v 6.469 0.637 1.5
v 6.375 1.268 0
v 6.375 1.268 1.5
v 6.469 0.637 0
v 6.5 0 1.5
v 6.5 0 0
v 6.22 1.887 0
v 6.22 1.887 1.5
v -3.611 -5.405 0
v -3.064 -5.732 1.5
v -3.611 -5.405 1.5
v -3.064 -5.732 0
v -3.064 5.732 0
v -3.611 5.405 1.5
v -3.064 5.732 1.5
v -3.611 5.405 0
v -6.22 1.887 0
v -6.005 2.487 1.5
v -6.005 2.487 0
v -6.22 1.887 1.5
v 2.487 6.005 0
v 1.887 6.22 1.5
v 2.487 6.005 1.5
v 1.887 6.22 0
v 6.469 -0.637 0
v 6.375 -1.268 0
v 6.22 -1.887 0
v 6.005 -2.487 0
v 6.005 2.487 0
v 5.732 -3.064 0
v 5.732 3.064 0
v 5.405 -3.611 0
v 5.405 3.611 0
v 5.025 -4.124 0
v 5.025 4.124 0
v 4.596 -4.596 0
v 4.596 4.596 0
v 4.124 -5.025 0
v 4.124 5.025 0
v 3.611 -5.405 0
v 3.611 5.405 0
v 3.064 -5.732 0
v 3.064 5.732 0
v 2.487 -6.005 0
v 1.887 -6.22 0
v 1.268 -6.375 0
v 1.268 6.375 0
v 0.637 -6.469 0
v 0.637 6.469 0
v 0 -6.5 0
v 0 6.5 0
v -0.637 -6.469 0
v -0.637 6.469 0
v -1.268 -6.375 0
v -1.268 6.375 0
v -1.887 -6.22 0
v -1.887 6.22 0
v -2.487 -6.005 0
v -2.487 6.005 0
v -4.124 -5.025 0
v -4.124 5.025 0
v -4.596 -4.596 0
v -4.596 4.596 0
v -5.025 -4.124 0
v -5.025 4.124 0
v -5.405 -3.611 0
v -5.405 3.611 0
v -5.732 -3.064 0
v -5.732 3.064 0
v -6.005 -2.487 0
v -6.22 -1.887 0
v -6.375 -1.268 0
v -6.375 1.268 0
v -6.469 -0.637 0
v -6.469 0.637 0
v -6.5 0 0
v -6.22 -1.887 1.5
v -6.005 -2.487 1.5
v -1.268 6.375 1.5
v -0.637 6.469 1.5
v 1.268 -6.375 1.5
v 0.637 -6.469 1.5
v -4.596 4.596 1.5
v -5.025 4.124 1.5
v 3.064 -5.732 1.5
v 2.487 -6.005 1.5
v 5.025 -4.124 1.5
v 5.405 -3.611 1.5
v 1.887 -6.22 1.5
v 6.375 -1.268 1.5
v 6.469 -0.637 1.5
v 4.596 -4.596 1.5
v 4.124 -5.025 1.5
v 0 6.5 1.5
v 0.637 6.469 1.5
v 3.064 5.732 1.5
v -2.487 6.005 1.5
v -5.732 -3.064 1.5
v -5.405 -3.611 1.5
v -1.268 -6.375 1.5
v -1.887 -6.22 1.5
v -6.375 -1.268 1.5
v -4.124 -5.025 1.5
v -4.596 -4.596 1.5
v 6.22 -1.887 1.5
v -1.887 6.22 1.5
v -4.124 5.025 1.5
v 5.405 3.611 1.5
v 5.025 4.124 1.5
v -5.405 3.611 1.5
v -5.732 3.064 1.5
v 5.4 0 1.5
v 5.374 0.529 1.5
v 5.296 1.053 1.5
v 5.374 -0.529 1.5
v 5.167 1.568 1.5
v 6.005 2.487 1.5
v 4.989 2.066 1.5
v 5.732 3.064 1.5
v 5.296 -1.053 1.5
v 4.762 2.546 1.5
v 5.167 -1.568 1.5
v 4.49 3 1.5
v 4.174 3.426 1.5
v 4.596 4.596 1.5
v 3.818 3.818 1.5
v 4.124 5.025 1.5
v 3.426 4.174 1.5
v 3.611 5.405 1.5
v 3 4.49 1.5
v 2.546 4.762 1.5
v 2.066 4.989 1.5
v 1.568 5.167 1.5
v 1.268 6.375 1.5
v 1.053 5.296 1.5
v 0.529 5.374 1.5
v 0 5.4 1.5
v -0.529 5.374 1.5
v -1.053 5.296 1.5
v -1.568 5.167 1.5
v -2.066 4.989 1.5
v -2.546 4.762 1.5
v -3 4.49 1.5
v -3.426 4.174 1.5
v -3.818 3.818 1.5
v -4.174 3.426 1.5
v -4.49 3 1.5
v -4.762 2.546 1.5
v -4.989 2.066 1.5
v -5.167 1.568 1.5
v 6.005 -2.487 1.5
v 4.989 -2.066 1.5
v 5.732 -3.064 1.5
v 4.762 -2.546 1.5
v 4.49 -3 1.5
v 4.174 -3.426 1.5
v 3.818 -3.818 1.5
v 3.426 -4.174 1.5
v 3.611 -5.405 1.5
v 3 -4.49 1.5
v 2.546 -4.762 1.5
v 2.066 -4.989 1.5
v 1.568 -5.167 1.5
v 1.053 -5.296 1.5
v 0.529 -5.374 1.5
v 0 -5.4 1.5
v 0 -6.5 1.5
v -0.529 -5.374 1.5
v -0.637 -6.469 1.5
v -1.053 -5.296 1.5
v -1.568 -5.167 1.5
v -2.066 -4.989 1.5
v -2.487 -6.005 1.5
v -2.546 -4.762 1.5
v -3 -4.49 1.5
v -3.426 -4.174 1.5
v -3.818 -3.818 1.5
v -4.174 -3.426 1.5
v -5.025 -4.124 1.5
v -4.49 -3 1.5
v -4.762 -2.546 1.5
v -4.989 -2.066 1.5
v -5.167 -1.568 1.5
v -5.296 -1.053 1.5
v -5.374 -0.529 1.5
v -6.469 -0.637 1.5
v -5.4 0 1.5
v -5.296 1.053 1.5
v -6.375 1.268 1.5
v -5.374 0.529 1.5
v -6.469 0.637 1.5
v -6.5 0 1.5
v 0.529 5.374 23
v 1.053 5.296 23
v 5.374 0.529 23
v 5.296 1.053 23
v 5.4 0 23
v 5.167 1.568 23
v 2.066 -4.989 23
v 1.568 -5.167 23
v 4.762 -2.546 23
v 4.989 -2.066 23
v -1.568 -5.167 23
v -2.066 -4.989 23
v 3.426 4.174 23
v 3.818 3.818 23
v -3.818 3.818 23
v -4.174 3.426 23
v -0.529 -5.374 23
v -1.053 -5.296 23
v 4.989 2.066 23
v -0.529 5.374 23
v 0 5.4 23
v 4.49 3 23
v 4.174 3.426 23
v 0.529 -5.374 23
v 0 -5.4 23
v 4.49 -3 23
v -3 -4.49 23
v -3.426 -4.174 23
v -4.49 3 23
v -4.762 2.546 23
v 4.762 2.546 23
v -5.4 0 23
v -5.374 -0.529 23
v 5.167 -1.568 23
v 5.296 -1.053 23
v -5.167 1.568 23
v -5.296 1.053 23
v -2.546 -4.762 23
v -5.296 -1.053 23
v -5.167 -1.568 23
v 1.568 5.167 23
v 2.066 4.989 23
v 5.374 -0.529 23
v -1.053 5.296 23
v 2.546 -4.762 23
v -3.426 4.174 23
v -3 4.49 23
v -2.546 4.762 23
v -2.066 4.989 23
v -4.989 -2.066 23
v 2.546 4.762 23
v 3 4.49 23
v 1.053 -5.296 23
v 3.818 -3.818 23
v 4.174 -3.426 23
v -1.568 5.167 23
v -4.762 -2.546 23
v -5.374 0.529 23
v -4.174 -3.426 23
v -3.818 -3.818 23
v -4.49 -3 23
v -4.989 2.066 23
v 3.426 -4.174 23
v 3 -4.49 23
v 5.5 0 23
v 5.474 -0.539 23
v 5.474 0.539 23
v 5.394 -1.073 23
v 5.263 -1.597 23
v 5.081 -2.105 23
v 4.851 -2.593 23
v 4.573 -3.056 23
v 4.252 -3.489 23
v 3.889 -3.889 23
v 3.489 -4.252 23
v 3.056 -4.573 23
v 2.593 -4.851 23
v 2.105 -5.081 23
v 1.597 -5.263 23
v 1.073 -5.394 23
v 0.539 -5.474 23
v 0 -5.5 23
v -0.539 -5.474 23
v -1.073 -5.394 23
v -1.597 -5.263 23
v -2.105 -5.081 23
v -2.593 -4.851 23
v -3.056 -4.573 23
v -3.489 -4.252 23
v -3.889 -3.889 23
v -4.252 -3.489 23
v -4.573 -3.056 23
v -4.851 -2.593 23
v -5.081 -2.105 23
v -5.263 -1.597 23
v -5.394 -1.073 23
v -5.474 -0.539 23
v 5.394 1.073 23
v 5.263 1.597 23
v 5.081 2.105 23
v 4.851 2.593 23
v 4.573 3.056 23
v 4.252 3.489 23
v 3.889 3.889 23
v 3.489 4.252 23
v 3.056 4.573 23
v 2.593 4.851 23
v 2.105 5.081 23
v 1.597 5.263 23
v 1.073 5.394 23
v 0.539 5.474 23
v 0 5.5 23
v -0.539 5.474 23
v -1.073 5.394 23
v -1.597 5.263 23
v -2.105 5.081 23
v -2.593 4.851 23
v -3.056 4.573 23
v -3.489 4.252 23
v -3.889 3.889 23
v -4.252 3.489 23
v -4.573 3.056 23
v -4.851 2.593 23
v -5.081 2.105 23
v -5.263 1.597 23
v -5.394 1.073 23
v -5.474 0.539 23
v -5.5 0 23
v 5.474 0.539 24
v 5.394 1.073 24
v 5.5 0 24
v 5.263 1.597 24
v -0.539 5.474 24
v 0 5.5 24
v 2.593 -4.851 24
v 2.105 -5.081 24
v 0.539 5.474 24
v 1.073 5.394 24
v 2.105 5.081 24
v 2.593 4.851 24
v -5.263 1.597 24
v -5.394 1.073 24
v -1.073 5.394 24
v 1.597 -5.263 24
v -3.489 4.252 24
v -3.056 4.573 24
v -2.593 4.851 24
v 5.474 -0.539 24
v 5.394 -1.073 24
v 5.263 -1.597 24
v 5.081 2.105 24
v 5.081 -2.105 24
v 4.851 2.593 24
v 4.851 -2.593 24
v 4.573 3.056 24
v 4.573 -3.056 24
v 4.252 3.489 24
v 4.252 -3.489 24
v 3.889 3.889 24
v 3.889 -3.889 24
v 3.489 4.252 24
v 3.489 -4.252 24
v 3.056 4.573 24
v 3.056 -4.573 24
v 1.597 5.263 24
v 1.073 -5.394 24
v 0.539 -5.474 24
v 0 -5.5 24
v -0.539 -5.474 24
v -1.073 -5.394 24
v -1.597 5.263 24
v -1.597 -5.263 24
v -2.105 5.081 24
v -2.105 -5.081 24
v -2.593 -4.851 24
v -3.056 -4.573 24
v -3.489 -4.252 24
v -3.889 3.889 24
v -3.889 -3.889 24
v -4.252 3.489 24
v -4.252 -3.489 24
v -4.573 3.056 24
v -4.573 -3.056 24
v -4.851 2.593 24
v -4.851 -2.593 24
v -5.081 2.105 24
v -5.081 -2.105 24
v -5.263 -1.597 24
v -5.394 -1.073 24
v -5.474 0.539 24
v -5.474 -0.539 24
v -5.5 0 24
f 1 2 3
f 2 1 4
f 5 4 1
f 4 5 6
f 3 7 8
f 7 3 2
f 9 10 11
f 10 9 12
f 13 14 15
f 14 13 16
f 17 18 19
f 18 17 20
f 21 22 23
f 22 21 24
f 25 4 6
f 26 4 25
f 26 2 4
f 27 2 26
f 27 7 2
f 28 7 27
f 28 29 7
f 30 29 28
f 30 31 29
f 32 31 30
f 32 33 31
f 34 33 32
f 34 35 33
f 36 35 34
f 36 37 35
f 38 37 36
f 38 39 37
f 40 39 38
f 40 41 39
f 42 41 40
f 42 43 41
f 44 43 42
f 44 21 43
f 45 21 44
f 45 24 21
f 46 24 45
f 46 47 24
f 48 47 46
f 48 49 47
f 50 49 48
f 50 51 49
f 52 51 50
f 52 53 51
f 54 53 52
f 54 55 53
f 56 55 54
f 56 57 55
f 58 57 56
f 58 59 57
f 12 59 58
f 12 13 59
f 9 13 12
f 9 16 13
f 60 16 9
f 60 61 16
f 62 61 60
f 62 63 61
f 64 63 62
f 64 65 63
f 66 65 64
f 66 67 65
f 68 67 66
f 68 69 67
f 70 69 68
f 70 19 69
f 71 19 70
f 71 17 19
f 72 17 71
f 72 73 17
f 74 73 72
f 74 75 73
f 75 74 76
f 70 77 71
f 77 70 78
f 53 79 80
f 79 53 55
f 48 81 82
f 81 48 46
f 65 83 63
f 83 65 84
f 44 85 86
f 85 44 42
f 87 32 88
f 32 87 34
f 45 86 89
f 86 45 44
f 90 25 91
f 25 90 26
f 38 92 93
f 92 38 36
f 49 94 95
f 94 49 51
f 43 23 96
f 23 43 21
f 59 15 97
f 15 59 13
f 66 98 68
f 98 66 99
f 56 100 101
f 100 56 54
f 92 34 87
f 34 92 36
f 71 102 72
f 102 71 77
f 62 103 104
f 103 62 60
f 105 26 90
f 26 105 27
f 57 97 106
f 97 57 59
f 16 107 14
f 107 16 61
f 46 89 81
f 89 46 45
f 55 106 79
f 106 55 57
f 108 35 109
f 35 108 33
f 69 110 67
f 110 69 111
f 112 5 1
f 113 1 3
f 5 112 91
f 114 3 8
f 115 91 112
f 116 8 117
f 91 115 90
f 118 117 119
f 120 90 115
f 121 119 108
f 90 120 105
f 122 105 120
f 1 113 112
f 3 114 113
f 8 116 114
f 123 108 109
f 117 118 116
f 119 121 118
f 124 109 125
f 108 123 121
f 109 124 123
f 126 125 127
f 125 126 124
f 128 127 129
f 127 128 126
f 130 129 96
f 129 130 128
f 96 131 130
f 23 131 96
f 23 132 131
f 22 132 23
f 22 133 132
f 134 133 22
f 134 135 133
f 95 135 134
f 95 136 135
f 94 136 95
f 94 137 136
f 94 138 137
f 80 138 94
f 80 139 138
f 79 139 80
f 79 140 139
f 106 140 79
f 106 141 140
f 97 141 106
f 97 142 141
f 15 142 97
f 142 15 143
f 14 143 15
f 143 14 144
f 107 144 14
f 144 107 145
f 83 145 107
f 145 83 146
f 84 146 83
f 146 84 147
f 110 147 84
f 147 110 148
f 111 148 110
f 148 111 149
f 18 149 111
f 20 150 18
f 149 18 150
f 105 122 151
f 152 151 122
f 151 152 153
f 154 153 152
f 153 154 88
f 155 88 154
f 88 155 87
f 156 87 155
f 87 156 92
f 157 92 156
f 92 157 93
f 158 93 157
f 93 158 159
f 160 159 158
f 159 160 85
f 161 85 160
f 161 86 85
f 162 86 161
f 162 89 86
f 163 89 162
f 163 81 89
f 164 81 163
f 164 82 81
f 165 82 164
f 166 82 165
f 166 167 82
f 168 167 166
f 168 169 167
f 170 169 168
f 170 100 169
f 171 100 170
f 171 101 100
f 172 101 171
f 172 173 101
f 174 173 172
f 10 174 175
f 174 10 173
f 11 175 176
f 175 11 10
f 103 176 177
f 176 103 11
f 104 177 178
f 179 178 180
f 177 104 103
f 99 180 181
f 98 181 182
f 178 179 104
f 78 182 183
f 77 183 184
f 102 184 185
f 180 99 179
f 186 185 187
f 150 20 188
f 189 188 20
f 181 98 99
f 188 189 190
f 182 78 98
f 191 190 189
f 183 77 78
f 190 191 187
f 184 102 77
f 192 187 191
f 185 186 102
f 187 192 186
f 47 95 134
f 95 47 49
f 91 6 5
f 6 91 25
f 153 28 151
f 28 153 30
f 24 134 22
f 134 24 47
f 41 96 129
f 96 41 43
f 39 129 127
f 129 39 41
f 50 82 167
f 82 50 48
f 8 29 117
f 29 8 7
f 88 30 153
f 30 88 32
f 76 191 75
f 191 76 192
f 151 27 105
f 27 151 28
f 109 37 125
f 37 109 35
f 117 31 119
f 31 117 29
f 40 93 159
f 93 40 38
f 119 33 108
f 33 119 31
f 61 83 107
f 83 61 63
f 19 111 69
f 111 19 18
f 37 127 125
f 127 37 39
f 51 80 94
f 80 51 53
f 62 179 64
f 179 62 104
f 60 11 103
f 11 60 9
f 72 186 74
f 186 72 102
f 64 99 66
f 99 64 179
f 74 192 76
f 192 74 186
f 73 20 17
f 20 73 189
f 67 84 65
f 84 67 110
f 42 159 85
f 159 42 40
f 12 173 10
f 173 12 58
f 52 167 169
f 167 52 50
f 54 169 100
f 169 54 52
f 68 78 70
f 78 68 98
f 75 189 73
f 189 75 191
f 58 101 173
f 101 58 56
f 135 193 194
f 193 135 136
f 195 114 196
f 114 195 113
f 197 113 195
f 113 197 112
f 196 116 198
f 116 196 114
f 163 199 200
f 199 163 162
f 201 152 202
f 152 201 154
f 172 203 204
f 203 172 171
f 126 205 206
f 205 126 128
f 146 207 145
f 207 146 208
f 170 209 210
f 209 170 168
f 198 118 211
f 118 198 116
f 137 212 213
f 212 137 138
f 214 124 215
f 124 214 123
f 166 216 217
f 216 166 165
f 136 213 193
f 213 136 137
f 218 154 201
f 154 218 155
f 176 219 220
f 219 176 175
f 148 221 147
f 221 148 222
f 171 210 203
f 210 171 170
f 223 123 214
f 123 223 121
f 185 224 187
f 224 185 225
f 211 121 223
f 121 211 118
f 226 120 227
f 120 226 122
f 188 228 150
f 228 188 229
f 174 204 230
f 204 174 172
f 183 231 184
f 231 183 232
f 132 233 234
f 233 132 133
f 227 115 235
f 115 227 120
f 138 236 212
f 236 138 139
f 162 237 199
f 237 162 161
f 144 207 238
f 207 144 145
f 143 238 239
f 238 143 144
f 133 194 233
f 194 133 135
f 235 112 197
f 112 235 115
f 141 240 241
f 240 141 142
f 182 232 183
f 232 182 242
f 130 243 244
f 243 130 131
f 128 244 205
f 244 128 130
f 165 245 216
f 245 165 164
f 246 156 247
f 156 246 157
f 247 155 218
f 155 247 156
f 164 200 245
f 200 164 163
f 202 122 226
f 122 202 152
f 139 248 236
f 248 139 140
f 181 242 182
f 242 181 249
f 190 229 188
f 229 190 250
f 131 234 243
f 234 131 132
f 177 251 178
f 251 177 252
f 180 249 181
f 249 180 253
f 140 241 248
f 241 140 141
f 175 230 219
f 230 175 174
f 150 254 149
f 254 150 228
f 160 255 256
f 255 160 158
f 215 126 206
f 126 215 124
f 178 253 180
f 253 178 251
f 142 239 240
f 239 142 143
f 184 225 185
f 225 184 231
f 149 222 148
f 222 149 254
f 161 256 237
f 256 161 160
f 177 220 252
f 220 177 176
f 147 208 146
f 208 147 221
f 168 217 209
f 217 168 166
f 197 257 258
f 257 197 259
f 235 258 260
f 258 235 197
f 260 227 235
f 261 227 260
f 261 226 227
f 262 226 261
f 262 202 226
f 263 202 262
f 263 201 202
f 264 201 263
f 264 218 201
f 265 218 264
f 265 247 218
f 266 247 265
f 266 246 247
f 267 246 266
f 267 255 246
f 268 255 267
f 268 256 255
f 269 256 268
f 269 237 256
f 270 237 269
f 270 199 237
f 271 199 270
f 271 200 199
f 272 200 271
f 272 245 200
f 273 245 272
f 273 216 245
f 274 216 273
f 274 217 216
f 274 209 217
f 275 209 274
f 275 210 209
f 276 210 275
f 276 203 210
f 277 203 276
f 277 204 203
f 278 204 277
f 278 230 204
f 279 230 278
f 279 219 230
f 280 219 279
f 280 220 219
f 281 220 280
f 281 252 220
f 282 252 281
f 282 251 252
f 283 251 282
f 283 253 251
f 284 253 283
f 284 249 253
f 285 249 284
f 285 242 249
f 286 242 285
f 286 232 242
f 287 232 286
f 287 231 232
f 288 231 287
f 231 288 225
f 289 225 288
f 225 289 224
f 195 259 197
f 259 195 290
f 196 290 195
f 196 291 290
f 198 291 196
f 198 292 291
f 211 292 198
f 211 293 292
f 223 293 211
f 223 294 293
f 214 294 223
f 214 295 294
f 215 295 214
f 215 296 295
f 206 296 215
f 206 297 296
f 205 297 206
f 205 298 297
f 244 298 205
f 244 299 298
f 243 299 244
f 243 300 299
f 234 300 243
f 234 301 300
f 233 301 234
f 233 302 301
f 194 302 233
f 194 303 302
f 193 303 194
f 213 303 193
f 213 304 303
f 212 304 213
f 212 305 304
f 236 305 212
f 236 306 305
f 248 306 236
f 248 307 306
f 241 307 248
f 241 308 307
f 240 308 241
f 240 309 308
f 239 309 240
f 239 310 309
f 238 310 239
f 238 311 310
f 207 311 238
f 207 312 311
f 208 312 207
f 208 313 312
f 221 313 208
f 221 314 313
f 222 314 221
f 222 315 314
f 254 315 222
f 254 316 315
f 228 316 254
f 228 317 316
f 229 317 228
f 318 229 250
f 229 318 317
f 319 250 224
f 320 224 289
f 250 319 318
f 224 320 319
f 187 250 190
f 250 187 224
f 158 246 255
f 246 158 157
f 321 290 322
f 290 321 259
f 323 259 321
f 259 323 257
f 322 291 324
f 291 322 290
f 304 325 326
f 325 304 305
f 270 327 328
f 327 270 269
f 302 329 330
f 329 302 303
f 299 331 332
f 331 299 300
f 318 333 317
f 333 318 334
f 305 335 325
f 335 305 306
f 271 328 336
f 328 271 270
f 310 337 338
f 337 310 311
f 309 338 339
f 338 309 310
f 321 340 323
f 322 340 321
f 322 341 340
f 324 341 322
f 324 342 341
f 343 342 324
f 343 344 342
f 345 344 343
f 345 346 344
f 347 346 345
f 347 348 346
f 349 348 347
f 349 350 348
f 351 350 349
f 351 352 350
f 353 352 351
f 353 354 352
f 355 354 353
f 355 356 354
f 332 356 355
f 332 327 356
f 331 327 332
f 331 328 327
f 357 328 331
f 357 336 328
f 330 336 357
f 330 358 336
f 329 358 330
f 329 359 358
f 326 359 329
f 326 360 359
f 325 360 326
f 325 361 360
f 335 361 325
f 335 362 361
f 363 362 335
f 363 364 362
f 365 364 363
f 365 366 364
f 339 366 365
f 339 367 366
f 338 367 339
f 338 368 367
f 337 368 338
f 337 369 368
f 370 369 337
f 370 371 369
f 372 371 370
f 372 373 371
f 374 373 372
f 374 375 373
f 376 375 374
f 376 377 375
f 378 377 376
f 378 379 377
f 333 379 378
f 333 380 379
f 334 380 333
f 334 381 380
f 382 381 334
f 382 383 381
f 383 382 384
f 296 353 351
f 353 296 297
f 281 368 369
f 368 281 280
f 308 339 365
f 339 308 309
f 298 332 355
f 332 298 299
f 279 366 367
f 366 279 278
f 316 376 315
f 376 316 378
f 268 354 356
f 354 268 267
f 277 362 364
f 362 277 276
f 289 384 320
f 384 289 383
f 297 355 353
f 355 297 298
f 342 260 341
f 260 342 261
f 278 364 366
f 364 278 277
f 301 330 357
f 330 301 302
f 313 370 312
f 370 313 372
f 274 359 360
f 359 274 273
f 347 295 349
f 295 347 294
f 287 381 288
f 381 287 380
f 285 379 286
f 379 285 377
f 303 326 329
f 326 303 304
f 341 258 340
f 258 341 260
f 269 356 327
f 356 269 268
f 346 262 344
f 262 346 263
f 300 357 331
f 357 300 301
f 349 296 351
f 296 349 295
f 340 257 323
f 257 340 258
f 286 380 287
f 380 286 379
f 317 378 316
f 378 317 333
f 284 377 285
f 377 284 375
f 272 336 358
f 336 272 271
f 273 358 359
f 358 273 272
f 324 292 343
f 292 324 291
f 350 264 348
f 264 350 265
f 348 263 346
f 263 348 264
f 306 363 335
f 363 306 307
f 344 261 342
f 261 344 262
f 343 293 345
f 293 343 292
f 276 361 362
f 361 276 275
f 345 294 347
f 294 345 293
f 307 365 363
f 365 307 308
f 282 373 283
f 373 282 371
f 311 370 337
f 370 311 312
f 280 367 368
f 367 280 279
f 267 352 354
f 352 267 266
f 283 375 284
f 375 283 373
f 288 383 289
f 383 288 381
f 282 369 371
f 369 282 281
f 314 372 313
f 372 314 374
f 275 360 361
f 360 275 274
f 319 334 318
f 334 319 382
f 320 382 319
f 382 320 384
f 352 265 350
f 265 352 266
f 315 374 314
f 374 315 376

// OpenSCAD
// Dimensions for 0.2 mL PCR Tube Adapter
// Units: mm

// Physical Dimensions
sleeve_outer_diameter = 10.8;   // Outer diameter of the main body
collar_diameter = 13.0;         // Diameter of the base collar
collar_thickness = 1.5;         // Height of the base collar
sleeve_height = 21.5;           // Total height of the sleeve body
bore_diameter = 6.2;            // Diameter of the internal bore

// Derived Dimensions
bore_radius = bore_diameter / 2;
sleeve_radius = sleeve_outer_diameter / 2;
collar_radius = collar_diameter / 2;
wall_thickness = sleeve_radius - bore_radius;

// Rendering Settings
$fn = 64; // High resolution for curved surfaces

// Main Assembly
union() {
    // 1. Base Collar (Rests on bed)
    // Adjusted to start exactly at z = 0
    cylinder(h = collar_thickness, r = collar_radius, center = false);

    // 2. Main Sleeve Body
    // Adjusted to start exactly at z = collar_thickness
    translate([0, 0, collar_thickness])
    cylinder(h = sleeve_height, r = sleeve_radius, center = false);

    // 3. Top Cap (to create the open bore)
    // We cut a thin disc out of the top of the cylinder to leave the bore open.
    // We extend the cutter slightly past the top face to ensure clean separation.
    translate([0, 0, collar_thickness + sleeve_height])
    cylinder(h = 1.0, r = sleeve_radius + 0.1, center = false);
}
